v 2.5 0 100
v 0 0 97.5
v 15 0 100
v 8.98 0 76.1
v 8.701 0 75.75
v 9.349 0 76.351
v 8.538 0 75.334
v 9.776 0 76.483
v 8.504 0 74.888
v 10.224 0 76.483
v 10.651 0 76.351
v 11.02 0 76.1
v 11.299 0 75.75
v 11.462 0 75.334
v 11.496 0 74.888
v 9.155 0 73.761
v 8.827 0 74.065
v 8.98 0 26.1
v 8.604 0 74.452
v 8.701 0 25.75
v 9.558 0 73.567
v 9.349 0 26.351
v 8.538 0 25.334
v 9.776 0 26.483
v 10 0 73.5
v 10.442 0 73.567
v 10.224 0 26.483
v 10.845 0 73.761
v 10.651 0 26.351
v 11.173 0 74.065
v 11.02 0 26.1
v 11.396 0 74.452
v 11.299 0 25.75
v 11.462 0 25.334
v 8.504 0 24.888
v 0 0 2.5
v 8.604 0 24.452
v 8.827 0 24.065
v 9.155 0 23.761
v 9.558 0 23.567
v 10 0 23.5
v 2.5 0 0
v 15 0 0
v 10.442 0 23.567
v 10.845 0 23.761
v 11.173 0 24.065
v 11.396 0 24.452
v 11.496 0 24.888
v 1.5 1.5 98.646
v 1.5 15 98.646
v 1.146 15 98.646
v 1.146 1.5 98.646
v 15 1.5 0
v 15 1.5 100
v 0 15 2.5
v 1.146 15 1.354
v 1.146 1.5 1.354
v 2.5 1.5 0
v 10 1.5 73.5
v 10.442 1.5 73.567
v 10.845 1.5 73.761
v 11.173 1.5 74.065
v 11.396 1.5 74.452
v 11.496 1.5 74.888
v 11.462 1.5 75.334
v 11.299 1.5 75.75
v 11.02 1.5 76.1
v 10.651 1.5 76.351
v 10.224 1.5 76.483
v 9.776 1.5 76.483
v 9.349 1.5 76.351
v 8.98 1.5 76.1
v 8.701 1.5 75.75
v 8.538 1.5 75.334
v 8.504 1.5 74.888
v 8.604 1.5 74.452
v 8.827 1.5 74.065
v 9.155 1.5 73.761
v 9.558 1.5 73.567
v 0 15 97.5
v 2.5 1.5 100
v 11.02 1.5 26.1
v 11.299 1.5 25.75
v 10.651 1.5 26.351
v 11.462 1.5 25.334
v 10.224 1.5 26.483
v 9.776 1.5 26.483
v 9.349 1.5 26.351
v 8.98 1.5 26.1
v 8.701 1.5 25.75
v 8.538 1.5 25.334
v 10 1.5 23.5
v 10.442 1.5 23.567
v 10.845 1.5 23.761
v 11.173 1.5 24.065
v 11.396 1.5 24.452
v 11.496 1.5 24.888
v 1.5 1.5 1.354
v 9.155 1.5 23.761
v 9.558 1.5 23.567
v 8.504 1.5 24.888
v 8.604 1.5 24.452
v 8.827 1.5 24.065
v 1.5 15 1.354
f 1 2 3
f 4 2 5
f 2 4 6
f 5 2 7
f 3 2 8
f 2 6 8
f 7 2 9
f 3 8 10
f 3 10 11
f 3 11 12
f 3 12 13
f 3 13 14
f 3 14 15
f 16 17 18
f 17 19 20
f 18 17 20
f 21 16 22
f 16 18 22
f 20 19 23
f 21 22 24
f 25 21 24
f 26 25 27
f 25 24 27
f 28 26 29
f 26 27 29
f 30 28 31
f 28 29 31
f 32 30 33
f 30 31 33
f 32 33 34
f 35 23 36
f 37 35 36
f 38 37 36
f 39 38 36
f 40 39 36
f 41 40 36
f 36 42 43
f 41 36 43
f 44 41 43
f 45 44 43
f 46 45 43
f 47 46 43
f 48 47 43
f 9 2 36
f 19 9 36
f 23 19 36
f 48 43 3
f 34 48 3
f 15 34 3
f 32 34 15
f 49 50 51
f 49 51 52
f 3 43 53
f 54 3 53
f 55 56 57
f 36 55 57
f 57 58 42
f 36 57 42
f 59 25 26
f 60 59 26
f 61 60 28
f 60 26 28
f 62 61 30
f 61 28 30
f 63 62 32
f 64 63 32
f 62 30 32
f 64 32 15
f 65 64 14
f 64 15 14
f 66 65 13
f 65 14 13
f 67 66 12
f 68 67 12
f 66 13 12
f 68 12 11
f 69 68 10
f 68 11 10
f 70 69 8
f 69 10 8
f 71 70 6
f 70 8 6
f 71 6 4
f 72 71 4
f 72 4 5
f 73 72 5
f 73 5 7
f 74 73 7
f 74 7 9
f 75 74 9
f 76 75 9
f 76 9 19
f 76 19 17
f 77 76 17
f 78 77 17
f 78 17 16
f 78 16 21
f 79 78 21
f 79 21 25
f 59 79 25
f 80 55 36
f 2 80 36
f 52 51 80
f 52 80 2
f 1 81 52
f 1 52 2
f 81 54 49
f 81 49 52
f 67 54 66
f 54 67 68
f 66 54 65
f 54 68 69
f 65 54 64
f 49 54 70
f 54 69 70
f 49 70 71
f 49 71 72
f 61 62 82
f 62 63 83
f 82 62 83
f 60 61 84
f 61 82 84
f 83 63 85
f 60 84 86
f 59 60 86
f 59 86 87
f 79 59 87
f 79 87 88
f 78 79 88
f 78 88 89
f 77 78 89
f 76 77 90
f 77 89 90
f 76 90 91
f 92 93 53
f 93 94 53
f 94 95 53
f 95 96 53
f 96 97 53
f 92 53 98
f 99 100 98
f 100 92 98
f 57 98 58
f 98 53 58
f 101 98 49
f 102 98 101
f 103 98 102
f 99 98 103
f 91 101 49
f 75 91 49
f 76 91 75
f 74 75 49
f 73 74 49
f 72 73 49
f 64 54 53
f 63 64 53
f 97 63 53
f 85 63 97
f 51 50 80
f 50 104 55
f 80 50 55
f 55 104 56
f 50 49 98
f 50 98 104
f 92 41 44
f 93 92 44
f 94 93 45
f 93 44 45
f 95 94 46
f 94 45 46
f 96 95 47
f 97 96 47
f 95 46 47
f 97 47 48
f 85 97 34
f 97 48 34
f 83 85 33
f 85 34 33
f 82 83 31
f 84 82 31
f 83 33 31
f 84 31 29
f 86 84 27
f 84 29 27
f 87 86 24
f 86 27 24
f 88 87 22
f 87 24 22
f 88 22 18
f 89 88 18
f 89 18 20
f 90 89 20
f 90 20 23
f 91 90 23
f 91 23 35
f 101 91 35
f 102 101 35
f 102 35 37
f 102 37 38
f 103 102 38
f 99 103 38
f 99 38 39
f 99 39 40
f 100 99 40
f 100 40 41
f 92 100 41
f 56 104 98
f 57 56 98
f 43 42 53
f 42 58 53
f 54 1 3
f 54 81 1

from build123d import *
from OCP.BRepFilletAPI import BRepFilletAPI_MakeChamfer

# Parameters (mm, degrees)
EXTRUSION1_DEPTH           = 100
ESQUISSE2_R                = 1.5
EXTRUSION2_DEPTH           = 100
R_P_TITION_LIN_AIRE1_COUNT = 2
R_P_TITION_LIN_AIRE1_PITCH = 50
CHANFREIN1_SIZE            = 2.5
CHANFREIN3_SIZE            = 0.5
CHANFREIN3_SIZE2           = 0.353553391


with BuildPart() as part:
    # Esquisse1 → Extrusion1 (new body)
    with BuildSketch(Plane.XY):
        Polygon((0, 0), (1.5, 0), (15, 0), (15, 1.5), (1.5, 1.5), (1.5, 15), (0, 15), align=None)
    extrude(amount=EXTRUSION1_DEPTH)

    # Esquisse2 → Extrusion2 (cut)
    with BuildSketch(Plane.XZ):
        with Locations(Location((10, 75, 0), (0, 0, 270))):
            Circle(ESQUISSE2_R)
    extrusion2 = extrude(amount=-EXTRUSION2_DEPTH, mode=Mode.SUBTRACT)

    # Répétition linéaire1: Extrusion2 ×2
    with Locations(*[(0, 0, -i * R_P_TITION_LIN_AIRE1_PITCH) for i in range(1, R_P_TITION_LIN_AIRE1_COUNT)]):
        add(extrusion2, mode=Mode.SUBTRACT)

    # Chanfrein1
    chanfrein1_edges = [part.edges().sort_by_distance(p)[0] for p in [
        (0, 7.5, 100),
        (0, 7.5, 0),
    ]]
    chamfer(chanfrein1_edges, length=CHANFREIN1_SIZE)

    # Chanfrein3: one chamfer whose edges measure the first distance from different faces: ONE call of the kernel's chamfer builder (chamfer() names one face for all edges)
    chanfrein3_edges_1 = [part.edges().sort_by_distance(p)[0] for p in [
        (1.5, 8.25, 1),
    ]]
    chanfrein3_side_1 = [part.faces().sort_by_distance(p)[0] for p in [
        (0.828125, 7.078125, 1.671875),
    ]]
    chanfrein3_edges_2 = [part.edges().sort_by_distance(p)[0] for p in [
        (1.5, 8.25, 99),
    ]]
    chanfrein3_side_2 = [part.faces().sort_by_distance(p)[0] for p in [
        (0.828125, 7.078125, 98.328125),
    ]]
    chanfrein3 = BRepFilletAPI_MakeChamfer(part.part.solid().wrapped)
    for e in chanfrein3_edges_1:
        chanfrein3.Add(CHANFREIN3_SIZE, CHANFREIN3_SIZE2, e.wrapped, chanfrein3_side_1[0].wrapped)  # the first distance lies on this face
    for e in chanfrein3_edges_2:
        chanfrein3.Add(CHANFREIN3_SIZE, CHANFREIN3_SIZE2, e.wrapped, chanfrein3_side_2[0].wrapped)  # the first distance lies on this face
    add(Compound.cast(chanfrein3.Shape()), mode=Mode.REPLACE)


solid = part.part
